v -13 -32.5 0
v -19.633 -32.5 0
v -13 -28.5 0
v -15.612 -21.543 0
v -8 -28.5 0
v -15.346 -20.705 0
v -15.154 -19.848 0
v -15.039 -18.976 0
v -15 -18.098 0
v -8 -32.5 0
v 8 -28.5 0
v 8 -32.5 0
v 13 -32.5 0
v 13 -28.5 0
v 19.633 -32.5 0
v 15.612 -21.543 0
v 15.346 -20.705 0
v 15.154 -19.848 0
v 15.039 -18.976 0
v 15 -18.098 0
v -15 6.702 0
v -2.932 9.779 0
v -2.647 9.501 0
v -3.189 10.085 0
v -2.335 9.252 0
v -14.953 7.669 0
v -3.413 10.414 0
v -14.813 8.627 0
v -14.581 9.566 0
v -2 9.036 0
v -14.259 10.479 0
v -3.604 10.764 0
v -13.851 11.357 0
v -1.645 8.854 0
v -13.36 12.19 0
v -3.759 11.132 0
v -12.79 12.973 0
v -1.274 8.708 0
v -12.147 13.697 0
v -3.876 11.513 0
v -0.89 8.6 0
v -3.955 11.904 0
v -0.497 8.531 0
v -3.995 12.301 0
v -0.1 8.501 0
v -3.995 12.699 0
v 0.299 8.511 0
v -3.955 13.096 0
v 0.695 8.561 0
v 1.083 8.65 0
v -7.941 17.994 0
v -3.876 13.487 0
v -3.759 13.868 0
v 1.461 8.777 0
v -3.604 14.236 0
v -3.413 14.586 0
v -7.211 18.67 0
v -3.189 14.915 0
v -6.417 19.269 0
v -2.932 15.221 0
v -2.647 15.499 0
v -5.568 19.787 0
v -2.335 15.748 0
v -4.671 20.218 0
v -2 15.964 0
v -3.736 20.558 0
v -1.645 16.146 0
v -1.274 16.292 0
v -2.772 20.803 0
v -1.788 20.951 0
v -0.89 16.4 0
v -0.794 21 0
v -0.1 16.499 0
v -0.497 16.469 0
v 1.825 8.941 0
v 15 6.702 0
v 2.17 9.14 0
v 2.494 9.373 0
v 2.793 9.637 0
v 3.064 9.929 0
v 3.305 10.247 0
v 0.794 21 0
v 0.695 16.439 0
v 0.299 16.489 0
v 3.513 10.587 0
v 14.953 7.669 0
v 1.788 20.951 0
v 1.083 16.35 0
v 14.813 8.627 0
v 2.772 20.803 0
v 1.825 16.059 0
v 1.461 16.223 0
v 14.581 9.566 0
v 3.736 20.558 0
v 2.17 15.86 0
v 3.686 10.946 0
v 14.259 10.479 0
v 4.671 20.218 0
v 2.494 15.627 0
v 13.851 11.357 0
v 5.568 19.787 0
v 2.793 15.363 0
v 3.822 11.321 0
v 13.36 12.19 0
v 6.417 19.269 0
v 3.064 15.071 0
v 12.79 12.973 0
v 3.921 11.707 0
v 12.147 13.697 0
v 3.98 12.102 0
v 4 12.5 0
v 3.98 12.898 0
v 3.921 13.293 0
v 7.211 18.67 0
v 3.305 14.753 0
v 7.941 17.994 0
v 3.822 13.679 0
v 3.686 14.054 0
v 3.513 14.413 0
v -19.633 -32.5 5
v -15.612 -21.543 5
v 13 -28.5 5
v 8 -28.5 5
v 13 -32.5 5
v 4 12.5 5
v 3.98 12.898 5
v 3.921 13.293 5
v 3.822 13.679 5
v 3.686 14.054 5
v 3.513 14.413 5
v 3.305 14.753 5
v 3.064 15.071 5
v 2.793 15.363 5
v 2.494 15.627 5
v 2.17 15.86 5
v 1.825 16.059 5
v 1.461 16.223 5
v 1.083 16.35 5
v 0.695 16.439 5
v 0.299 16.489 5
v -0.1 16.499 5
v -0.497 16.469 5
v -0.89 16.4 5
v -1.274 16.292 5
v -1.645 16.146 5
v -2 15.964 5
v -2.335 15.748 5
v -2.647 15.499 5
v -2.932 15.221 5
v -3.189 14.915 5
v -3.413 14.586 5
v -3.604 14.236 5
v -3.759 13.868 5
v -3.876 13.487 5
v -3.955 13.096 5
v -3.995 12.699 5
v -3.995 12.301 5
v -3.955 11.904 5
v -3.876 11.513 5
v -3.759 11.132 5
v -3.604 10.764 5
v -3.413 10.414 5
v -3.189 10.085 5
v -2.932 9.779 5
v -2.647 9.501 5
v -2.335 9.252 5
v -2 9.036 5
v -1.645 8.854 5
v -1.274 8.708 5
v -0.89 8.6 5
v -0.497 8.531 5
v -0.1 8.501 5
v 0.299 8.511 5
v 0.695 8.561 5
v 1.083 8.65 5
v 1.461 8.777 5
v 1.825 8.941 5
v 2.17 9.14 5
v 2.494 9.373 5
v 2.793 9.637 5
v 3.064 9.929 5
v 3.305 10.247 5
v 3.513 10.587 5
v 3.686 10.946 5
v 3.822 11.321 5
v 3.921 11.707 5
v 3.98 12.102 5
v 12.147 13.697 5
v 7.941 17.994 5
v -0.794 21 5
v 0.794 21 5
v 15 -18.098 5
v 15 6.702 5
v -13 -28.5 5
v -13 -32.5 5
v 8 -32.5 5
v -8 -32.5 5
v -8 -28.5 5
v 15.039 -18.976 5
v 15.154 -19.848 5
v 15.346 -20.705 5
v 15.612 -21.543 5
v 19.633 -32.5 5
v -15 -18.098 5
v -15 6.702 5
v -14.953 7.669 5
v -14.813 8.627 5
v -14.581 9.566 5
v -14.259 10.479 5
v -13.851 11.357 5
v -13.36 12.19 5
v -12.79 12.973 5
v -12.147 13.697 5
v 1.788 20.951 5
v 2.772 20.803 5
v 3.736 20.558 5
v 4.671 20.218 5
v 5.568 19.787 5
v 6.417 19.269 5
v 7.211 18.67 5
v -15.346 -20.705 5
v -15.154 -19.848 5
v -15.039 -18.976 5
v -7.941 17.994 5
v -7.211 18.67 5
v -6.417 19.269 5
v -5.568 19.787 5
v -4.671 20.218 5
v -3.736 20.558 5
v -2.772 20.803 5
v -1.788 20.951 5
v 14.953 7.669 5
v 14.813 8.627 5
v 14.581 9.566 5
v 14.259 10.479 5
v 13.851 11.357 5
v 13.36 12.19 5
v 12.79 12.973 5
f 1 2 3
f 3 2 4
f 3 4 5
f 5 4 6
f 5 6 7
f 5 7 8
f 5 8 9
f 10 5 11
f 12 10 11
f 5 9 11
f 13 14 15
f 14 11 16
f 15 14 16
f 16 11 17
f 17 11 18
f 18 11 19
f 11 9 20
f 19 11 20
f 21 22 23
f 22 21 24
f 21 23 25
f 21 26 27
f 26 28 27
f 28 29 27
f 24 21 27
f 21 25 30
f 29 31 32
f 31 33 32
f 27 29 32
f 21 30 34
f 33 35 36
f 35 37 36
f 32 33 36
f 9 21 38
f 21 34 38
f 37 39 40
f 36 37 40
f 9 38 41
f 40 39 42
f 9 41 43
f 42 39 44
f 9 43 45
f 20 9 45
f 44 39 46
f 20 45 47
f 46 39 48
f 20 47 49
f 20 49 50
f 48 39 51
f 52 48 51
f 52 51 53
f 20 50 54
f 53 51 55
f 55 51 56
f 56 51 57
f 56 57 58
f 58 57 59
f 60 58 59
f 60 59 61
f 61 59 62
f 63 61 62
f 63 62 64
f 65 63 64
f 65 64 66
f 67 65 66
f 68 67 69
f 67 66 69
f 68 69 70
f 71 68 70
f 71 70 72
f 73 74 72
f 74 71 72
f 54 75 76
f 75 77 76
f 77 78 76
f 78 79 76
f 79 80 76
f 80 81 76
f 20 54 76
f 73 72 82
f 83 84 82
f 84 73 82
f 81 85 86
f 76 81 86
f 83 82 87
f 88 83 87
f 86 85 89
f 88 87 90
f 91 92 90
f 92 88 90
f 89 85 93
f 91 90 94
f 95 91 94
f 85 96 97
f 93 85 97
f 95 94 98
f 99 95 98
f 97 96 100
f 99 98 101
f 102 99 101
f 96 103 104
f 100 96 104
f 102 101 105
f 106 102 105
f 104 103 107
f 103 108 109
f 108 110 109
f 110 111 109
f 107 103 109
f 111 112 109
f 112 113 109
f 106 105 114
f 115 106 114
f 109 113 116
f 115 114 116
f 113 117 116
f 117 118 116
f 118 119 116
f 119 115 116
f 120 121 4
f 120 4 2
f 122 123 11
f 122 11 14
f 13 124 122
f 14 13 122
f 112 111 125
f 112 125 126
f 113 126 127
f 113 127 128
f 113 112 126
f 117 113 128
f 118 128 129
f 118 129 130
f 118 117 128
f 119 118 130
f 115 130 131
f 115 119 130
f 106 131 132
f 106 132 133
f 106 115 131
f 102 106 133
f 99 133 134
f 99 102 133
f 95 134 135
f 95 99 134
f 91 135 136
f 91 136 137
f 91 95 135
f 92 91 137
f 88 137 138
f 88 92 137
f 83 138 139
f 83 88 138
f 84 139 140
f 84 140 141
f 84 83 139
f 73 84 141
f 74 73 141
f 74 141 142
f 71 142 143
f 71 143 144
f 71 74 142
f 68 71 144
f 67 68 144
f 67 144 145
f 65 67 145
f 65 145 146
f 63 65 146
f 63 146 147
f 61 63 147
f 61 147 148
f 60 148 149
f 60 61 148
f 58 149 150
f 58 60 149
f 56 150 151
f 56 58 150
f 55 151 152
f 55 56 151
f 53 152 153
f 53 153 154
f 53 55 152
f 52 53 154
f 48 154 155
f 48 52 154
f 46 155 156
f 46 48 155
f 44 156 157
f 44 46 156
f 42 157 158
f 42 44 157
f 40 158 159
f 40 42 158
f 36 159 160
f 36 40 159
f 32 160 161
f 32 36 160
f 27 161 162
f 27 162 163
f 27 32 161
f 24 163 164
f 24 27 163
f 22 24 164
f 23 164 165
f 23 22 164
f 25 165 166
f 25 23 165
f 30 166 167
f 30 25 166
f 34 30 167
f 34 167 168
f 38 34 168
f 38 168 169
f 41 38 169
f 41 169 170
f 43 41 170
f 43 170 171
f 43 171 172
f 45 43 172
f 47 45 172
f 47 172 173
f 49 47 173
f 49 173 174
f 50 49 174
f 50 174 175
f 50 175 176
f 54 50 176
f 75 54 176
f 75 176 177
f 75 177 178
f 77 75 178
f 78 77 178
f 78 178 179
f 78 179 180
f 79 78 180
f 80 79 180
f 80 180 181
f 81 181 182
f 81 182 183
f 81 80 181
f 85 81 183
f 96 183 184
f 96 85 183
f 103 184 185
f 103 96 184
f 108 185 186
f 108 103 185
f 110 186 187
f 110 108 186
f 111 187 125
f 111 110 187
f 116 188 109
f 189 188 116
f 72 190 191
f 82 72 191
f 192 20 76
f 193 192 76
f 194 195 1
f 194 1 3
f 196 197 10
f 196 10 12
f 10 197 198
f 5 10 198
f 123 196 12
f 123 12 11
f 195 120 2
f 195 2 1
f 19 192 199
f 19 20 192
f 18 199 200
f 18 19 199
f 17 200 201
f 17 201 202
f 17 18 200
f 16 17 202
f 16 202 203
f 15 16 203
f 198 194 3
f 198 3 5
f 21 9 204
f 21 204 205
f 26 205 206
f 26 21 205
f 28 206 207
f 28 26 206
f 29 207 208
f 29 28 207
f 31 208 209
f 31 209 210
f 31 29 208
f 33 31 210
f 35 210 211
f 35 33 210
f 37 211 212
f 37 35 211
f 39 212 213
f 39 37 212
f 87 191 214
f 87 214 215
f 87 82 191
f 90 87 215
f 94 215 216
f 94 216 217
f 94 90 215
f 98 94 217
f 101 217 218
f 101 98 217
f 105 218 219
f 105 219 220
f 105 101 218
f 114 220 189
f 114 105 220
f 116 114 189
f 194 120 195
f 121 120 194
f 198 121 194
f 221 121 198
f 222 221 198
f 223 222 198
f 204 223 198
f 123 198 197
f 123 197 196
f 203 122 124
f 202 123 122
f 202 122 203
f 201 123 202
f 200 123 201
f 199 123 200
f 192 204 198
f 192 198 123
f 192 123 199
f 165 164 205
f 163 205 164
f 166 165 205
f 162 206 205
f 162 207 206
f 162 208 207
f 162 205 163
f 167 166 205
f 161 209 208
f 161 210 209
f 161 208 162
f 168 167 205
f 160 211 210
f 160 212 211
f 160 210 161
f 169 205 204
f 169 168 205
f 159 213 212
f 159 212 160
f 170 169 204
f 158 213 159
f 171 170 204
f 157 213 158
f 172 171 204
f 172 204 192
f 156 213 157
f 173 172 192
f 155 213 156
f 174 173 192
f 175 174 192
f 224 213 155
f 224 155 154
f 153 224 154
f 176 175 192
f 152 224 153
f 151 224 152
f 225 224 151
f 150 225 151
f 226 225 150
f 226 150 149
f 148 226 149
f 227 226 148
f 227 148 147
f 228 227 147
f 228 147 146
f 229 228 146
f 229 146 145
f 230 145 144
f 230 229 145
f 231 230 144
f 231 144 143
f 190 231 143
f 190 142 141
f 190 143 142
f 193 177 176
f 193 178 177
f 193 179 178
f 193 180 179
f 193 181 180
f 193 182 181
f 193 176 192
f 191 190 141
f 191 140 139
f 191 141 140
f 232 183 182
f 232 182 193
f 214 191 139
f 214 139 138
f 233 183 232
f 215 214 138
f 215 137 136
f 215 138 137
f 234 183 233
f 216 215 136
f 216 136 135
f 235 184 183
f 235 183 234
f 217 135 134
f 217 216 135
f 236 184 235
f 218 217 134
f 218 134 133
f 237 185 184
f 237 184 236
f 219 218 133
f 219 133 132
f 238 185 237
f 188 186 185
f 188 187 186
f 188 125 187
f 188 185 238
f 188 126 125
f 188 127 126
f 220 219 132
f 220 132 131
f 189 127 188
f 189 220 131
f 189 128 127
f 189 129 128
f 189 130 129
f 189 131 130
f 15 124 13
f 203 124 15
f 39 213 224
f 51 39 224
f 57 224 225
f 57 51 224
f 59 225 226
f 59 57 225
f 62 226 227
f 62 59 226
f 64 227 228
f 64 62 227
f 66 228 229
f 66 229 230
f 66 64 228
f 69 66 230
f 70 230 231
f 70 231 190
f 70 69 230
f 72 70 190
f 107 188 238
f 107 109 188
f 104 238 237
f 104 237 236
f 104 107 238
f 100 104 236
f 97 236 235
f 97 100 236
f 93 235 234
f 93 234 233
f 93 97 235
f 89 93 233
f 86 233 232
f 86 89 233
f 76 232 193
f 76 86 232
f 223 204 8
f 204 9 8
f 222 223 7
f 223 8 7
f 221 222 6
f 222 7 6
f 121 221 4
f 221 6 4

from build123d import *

# Parameters (mm, degrees)
ESQUISSE1_W             = 30
ESQUISSE1_H             = 67
ESQUISSE1_R             = 4
BOSS_EXTRU_1_DEPTH      = 5
ESQUISSE2_W             = 30
ESQUISSE2_H             = 12.5
ENL_V_MAT_EXTRU_1_DEPTH = 5
ESQUISSE3_W             = 5
ESQUISSE3_H             = 5
ENL_V_MAT_EXTRU_2_DEPTH = 38.043892884
BOSS_EXTRU_2_DEPTH      = 5
ENL_V_MAT_EXTRU_3_DEPTH = 40.33509883
ESQUISSE8_W             = 41.113396405
ESQUISSE8_H             = 1
ENL_V_MAT_EXTRU_4_DEPTH = 40.33509883
CONG_1_R                = 10
CONG_2_R                = 10


with BuildPart() as part:
    # Esquisse1 → Boss.-Extru.1 (new body)
    with BuildSketch(Plane.XY):
        Rectangle(ESQUISSE1_W, ESQUISSE1_H)
        with Locations((0, 12.5)):
            Circle(ESQUISSE1_R, mode=Mode.SUBTRACT)
    extrude(amount=BOSS_EXTRU_1_DEPTH)

    # Esquisse2 → Enlèv. mat.-Extru.1 (cut)
    with BuildSketch(Plane.XY.offset(5)):
        with Locations((0, 27.25)):
            Rectangle(ESQUISSE2_W, ESQUISSE2_H)
    extrude(amount=-ENL_V_MAT_EXTRU_1_DEPTH, mode=Mode.SUBTRACT)

    # Esquisse3 → Enlèv. mat.-Extru.2 (cut, through all)
    with BuildSketch(Plane.XY.offset(5)):
        with Locations((-10.5, -31)):
            Rectangle(ESQUISSE3_W, ESQUISSE3_H)
        with Locations((10.5, -31)):
            Rectangle(ESQUISSE3_W, ESQUISSE3_H)
    extrude(amount=-ENL_V_MAT_EXTRU_2_DEPTH, mode=Mode.SUBTRACT)

    # Esquisse5 → Boss.-Extru.2 (add)
    with BuildSketch(Plane.XY.offset(5)):
        Polygon((-15, -19.875), (-20, -33.5), (-15, -33.5), align=None)
        Polygon((15, -19.875), (20, -33.5), (15, -33.5), align=None)
    extrude(amount=-BOSS_EXTRU_2_DEPTH)

    # Esquisse6 → Enlèv. mat.-Extru.3 (cut, through all)
    with BuildSketch(Plane.XY.offset(5)):
        Polygon((-15, 10.78125), (-5, 21), (-15, 21), align=None)
        Polygon((15, 10.78125), (5, 21), (15, 21), align=None)
    extrude(amount=-ENL_V_MAT_EXTRU_3_DEPTH, mode=Mode.SUBTRACT)

    # Esquisse8 → Enlèv. mat.-Extru.4 (cut, through all)
    with BuildSketch(Plane.XY.offset(5)):
        with Locations((0.556698202, -33)):
            Rectangle(ESQUISSE8_W, ESQUISSE8_H)
    extrude(amount=-ENL_V_MAT_EXTRU_4_DEPTH, mode=Mode.SUBTRACT)

    # Congé1
    cong_1_edges = [part.edges().sort_by_distance(p)[0] for p in [
        (-15, 10.78125, 2.5),
        (-5, 21, 2.5),
        (15, 10.78125, 2.5),
        (5, 21, 2.5),
    ]]
    fillet(cong_1_edges, radius=CONG_1_R)

    # Congé2
    cong_2_edges = [part.edges().sort_by_distance(p)[0] for p in [
        (-15, -19.875, 2.5),
        (15, -19.875, 2.5),
    ]]
    fillet(cong_2_edges, radius=CONG_2_R)


solid = part.part
